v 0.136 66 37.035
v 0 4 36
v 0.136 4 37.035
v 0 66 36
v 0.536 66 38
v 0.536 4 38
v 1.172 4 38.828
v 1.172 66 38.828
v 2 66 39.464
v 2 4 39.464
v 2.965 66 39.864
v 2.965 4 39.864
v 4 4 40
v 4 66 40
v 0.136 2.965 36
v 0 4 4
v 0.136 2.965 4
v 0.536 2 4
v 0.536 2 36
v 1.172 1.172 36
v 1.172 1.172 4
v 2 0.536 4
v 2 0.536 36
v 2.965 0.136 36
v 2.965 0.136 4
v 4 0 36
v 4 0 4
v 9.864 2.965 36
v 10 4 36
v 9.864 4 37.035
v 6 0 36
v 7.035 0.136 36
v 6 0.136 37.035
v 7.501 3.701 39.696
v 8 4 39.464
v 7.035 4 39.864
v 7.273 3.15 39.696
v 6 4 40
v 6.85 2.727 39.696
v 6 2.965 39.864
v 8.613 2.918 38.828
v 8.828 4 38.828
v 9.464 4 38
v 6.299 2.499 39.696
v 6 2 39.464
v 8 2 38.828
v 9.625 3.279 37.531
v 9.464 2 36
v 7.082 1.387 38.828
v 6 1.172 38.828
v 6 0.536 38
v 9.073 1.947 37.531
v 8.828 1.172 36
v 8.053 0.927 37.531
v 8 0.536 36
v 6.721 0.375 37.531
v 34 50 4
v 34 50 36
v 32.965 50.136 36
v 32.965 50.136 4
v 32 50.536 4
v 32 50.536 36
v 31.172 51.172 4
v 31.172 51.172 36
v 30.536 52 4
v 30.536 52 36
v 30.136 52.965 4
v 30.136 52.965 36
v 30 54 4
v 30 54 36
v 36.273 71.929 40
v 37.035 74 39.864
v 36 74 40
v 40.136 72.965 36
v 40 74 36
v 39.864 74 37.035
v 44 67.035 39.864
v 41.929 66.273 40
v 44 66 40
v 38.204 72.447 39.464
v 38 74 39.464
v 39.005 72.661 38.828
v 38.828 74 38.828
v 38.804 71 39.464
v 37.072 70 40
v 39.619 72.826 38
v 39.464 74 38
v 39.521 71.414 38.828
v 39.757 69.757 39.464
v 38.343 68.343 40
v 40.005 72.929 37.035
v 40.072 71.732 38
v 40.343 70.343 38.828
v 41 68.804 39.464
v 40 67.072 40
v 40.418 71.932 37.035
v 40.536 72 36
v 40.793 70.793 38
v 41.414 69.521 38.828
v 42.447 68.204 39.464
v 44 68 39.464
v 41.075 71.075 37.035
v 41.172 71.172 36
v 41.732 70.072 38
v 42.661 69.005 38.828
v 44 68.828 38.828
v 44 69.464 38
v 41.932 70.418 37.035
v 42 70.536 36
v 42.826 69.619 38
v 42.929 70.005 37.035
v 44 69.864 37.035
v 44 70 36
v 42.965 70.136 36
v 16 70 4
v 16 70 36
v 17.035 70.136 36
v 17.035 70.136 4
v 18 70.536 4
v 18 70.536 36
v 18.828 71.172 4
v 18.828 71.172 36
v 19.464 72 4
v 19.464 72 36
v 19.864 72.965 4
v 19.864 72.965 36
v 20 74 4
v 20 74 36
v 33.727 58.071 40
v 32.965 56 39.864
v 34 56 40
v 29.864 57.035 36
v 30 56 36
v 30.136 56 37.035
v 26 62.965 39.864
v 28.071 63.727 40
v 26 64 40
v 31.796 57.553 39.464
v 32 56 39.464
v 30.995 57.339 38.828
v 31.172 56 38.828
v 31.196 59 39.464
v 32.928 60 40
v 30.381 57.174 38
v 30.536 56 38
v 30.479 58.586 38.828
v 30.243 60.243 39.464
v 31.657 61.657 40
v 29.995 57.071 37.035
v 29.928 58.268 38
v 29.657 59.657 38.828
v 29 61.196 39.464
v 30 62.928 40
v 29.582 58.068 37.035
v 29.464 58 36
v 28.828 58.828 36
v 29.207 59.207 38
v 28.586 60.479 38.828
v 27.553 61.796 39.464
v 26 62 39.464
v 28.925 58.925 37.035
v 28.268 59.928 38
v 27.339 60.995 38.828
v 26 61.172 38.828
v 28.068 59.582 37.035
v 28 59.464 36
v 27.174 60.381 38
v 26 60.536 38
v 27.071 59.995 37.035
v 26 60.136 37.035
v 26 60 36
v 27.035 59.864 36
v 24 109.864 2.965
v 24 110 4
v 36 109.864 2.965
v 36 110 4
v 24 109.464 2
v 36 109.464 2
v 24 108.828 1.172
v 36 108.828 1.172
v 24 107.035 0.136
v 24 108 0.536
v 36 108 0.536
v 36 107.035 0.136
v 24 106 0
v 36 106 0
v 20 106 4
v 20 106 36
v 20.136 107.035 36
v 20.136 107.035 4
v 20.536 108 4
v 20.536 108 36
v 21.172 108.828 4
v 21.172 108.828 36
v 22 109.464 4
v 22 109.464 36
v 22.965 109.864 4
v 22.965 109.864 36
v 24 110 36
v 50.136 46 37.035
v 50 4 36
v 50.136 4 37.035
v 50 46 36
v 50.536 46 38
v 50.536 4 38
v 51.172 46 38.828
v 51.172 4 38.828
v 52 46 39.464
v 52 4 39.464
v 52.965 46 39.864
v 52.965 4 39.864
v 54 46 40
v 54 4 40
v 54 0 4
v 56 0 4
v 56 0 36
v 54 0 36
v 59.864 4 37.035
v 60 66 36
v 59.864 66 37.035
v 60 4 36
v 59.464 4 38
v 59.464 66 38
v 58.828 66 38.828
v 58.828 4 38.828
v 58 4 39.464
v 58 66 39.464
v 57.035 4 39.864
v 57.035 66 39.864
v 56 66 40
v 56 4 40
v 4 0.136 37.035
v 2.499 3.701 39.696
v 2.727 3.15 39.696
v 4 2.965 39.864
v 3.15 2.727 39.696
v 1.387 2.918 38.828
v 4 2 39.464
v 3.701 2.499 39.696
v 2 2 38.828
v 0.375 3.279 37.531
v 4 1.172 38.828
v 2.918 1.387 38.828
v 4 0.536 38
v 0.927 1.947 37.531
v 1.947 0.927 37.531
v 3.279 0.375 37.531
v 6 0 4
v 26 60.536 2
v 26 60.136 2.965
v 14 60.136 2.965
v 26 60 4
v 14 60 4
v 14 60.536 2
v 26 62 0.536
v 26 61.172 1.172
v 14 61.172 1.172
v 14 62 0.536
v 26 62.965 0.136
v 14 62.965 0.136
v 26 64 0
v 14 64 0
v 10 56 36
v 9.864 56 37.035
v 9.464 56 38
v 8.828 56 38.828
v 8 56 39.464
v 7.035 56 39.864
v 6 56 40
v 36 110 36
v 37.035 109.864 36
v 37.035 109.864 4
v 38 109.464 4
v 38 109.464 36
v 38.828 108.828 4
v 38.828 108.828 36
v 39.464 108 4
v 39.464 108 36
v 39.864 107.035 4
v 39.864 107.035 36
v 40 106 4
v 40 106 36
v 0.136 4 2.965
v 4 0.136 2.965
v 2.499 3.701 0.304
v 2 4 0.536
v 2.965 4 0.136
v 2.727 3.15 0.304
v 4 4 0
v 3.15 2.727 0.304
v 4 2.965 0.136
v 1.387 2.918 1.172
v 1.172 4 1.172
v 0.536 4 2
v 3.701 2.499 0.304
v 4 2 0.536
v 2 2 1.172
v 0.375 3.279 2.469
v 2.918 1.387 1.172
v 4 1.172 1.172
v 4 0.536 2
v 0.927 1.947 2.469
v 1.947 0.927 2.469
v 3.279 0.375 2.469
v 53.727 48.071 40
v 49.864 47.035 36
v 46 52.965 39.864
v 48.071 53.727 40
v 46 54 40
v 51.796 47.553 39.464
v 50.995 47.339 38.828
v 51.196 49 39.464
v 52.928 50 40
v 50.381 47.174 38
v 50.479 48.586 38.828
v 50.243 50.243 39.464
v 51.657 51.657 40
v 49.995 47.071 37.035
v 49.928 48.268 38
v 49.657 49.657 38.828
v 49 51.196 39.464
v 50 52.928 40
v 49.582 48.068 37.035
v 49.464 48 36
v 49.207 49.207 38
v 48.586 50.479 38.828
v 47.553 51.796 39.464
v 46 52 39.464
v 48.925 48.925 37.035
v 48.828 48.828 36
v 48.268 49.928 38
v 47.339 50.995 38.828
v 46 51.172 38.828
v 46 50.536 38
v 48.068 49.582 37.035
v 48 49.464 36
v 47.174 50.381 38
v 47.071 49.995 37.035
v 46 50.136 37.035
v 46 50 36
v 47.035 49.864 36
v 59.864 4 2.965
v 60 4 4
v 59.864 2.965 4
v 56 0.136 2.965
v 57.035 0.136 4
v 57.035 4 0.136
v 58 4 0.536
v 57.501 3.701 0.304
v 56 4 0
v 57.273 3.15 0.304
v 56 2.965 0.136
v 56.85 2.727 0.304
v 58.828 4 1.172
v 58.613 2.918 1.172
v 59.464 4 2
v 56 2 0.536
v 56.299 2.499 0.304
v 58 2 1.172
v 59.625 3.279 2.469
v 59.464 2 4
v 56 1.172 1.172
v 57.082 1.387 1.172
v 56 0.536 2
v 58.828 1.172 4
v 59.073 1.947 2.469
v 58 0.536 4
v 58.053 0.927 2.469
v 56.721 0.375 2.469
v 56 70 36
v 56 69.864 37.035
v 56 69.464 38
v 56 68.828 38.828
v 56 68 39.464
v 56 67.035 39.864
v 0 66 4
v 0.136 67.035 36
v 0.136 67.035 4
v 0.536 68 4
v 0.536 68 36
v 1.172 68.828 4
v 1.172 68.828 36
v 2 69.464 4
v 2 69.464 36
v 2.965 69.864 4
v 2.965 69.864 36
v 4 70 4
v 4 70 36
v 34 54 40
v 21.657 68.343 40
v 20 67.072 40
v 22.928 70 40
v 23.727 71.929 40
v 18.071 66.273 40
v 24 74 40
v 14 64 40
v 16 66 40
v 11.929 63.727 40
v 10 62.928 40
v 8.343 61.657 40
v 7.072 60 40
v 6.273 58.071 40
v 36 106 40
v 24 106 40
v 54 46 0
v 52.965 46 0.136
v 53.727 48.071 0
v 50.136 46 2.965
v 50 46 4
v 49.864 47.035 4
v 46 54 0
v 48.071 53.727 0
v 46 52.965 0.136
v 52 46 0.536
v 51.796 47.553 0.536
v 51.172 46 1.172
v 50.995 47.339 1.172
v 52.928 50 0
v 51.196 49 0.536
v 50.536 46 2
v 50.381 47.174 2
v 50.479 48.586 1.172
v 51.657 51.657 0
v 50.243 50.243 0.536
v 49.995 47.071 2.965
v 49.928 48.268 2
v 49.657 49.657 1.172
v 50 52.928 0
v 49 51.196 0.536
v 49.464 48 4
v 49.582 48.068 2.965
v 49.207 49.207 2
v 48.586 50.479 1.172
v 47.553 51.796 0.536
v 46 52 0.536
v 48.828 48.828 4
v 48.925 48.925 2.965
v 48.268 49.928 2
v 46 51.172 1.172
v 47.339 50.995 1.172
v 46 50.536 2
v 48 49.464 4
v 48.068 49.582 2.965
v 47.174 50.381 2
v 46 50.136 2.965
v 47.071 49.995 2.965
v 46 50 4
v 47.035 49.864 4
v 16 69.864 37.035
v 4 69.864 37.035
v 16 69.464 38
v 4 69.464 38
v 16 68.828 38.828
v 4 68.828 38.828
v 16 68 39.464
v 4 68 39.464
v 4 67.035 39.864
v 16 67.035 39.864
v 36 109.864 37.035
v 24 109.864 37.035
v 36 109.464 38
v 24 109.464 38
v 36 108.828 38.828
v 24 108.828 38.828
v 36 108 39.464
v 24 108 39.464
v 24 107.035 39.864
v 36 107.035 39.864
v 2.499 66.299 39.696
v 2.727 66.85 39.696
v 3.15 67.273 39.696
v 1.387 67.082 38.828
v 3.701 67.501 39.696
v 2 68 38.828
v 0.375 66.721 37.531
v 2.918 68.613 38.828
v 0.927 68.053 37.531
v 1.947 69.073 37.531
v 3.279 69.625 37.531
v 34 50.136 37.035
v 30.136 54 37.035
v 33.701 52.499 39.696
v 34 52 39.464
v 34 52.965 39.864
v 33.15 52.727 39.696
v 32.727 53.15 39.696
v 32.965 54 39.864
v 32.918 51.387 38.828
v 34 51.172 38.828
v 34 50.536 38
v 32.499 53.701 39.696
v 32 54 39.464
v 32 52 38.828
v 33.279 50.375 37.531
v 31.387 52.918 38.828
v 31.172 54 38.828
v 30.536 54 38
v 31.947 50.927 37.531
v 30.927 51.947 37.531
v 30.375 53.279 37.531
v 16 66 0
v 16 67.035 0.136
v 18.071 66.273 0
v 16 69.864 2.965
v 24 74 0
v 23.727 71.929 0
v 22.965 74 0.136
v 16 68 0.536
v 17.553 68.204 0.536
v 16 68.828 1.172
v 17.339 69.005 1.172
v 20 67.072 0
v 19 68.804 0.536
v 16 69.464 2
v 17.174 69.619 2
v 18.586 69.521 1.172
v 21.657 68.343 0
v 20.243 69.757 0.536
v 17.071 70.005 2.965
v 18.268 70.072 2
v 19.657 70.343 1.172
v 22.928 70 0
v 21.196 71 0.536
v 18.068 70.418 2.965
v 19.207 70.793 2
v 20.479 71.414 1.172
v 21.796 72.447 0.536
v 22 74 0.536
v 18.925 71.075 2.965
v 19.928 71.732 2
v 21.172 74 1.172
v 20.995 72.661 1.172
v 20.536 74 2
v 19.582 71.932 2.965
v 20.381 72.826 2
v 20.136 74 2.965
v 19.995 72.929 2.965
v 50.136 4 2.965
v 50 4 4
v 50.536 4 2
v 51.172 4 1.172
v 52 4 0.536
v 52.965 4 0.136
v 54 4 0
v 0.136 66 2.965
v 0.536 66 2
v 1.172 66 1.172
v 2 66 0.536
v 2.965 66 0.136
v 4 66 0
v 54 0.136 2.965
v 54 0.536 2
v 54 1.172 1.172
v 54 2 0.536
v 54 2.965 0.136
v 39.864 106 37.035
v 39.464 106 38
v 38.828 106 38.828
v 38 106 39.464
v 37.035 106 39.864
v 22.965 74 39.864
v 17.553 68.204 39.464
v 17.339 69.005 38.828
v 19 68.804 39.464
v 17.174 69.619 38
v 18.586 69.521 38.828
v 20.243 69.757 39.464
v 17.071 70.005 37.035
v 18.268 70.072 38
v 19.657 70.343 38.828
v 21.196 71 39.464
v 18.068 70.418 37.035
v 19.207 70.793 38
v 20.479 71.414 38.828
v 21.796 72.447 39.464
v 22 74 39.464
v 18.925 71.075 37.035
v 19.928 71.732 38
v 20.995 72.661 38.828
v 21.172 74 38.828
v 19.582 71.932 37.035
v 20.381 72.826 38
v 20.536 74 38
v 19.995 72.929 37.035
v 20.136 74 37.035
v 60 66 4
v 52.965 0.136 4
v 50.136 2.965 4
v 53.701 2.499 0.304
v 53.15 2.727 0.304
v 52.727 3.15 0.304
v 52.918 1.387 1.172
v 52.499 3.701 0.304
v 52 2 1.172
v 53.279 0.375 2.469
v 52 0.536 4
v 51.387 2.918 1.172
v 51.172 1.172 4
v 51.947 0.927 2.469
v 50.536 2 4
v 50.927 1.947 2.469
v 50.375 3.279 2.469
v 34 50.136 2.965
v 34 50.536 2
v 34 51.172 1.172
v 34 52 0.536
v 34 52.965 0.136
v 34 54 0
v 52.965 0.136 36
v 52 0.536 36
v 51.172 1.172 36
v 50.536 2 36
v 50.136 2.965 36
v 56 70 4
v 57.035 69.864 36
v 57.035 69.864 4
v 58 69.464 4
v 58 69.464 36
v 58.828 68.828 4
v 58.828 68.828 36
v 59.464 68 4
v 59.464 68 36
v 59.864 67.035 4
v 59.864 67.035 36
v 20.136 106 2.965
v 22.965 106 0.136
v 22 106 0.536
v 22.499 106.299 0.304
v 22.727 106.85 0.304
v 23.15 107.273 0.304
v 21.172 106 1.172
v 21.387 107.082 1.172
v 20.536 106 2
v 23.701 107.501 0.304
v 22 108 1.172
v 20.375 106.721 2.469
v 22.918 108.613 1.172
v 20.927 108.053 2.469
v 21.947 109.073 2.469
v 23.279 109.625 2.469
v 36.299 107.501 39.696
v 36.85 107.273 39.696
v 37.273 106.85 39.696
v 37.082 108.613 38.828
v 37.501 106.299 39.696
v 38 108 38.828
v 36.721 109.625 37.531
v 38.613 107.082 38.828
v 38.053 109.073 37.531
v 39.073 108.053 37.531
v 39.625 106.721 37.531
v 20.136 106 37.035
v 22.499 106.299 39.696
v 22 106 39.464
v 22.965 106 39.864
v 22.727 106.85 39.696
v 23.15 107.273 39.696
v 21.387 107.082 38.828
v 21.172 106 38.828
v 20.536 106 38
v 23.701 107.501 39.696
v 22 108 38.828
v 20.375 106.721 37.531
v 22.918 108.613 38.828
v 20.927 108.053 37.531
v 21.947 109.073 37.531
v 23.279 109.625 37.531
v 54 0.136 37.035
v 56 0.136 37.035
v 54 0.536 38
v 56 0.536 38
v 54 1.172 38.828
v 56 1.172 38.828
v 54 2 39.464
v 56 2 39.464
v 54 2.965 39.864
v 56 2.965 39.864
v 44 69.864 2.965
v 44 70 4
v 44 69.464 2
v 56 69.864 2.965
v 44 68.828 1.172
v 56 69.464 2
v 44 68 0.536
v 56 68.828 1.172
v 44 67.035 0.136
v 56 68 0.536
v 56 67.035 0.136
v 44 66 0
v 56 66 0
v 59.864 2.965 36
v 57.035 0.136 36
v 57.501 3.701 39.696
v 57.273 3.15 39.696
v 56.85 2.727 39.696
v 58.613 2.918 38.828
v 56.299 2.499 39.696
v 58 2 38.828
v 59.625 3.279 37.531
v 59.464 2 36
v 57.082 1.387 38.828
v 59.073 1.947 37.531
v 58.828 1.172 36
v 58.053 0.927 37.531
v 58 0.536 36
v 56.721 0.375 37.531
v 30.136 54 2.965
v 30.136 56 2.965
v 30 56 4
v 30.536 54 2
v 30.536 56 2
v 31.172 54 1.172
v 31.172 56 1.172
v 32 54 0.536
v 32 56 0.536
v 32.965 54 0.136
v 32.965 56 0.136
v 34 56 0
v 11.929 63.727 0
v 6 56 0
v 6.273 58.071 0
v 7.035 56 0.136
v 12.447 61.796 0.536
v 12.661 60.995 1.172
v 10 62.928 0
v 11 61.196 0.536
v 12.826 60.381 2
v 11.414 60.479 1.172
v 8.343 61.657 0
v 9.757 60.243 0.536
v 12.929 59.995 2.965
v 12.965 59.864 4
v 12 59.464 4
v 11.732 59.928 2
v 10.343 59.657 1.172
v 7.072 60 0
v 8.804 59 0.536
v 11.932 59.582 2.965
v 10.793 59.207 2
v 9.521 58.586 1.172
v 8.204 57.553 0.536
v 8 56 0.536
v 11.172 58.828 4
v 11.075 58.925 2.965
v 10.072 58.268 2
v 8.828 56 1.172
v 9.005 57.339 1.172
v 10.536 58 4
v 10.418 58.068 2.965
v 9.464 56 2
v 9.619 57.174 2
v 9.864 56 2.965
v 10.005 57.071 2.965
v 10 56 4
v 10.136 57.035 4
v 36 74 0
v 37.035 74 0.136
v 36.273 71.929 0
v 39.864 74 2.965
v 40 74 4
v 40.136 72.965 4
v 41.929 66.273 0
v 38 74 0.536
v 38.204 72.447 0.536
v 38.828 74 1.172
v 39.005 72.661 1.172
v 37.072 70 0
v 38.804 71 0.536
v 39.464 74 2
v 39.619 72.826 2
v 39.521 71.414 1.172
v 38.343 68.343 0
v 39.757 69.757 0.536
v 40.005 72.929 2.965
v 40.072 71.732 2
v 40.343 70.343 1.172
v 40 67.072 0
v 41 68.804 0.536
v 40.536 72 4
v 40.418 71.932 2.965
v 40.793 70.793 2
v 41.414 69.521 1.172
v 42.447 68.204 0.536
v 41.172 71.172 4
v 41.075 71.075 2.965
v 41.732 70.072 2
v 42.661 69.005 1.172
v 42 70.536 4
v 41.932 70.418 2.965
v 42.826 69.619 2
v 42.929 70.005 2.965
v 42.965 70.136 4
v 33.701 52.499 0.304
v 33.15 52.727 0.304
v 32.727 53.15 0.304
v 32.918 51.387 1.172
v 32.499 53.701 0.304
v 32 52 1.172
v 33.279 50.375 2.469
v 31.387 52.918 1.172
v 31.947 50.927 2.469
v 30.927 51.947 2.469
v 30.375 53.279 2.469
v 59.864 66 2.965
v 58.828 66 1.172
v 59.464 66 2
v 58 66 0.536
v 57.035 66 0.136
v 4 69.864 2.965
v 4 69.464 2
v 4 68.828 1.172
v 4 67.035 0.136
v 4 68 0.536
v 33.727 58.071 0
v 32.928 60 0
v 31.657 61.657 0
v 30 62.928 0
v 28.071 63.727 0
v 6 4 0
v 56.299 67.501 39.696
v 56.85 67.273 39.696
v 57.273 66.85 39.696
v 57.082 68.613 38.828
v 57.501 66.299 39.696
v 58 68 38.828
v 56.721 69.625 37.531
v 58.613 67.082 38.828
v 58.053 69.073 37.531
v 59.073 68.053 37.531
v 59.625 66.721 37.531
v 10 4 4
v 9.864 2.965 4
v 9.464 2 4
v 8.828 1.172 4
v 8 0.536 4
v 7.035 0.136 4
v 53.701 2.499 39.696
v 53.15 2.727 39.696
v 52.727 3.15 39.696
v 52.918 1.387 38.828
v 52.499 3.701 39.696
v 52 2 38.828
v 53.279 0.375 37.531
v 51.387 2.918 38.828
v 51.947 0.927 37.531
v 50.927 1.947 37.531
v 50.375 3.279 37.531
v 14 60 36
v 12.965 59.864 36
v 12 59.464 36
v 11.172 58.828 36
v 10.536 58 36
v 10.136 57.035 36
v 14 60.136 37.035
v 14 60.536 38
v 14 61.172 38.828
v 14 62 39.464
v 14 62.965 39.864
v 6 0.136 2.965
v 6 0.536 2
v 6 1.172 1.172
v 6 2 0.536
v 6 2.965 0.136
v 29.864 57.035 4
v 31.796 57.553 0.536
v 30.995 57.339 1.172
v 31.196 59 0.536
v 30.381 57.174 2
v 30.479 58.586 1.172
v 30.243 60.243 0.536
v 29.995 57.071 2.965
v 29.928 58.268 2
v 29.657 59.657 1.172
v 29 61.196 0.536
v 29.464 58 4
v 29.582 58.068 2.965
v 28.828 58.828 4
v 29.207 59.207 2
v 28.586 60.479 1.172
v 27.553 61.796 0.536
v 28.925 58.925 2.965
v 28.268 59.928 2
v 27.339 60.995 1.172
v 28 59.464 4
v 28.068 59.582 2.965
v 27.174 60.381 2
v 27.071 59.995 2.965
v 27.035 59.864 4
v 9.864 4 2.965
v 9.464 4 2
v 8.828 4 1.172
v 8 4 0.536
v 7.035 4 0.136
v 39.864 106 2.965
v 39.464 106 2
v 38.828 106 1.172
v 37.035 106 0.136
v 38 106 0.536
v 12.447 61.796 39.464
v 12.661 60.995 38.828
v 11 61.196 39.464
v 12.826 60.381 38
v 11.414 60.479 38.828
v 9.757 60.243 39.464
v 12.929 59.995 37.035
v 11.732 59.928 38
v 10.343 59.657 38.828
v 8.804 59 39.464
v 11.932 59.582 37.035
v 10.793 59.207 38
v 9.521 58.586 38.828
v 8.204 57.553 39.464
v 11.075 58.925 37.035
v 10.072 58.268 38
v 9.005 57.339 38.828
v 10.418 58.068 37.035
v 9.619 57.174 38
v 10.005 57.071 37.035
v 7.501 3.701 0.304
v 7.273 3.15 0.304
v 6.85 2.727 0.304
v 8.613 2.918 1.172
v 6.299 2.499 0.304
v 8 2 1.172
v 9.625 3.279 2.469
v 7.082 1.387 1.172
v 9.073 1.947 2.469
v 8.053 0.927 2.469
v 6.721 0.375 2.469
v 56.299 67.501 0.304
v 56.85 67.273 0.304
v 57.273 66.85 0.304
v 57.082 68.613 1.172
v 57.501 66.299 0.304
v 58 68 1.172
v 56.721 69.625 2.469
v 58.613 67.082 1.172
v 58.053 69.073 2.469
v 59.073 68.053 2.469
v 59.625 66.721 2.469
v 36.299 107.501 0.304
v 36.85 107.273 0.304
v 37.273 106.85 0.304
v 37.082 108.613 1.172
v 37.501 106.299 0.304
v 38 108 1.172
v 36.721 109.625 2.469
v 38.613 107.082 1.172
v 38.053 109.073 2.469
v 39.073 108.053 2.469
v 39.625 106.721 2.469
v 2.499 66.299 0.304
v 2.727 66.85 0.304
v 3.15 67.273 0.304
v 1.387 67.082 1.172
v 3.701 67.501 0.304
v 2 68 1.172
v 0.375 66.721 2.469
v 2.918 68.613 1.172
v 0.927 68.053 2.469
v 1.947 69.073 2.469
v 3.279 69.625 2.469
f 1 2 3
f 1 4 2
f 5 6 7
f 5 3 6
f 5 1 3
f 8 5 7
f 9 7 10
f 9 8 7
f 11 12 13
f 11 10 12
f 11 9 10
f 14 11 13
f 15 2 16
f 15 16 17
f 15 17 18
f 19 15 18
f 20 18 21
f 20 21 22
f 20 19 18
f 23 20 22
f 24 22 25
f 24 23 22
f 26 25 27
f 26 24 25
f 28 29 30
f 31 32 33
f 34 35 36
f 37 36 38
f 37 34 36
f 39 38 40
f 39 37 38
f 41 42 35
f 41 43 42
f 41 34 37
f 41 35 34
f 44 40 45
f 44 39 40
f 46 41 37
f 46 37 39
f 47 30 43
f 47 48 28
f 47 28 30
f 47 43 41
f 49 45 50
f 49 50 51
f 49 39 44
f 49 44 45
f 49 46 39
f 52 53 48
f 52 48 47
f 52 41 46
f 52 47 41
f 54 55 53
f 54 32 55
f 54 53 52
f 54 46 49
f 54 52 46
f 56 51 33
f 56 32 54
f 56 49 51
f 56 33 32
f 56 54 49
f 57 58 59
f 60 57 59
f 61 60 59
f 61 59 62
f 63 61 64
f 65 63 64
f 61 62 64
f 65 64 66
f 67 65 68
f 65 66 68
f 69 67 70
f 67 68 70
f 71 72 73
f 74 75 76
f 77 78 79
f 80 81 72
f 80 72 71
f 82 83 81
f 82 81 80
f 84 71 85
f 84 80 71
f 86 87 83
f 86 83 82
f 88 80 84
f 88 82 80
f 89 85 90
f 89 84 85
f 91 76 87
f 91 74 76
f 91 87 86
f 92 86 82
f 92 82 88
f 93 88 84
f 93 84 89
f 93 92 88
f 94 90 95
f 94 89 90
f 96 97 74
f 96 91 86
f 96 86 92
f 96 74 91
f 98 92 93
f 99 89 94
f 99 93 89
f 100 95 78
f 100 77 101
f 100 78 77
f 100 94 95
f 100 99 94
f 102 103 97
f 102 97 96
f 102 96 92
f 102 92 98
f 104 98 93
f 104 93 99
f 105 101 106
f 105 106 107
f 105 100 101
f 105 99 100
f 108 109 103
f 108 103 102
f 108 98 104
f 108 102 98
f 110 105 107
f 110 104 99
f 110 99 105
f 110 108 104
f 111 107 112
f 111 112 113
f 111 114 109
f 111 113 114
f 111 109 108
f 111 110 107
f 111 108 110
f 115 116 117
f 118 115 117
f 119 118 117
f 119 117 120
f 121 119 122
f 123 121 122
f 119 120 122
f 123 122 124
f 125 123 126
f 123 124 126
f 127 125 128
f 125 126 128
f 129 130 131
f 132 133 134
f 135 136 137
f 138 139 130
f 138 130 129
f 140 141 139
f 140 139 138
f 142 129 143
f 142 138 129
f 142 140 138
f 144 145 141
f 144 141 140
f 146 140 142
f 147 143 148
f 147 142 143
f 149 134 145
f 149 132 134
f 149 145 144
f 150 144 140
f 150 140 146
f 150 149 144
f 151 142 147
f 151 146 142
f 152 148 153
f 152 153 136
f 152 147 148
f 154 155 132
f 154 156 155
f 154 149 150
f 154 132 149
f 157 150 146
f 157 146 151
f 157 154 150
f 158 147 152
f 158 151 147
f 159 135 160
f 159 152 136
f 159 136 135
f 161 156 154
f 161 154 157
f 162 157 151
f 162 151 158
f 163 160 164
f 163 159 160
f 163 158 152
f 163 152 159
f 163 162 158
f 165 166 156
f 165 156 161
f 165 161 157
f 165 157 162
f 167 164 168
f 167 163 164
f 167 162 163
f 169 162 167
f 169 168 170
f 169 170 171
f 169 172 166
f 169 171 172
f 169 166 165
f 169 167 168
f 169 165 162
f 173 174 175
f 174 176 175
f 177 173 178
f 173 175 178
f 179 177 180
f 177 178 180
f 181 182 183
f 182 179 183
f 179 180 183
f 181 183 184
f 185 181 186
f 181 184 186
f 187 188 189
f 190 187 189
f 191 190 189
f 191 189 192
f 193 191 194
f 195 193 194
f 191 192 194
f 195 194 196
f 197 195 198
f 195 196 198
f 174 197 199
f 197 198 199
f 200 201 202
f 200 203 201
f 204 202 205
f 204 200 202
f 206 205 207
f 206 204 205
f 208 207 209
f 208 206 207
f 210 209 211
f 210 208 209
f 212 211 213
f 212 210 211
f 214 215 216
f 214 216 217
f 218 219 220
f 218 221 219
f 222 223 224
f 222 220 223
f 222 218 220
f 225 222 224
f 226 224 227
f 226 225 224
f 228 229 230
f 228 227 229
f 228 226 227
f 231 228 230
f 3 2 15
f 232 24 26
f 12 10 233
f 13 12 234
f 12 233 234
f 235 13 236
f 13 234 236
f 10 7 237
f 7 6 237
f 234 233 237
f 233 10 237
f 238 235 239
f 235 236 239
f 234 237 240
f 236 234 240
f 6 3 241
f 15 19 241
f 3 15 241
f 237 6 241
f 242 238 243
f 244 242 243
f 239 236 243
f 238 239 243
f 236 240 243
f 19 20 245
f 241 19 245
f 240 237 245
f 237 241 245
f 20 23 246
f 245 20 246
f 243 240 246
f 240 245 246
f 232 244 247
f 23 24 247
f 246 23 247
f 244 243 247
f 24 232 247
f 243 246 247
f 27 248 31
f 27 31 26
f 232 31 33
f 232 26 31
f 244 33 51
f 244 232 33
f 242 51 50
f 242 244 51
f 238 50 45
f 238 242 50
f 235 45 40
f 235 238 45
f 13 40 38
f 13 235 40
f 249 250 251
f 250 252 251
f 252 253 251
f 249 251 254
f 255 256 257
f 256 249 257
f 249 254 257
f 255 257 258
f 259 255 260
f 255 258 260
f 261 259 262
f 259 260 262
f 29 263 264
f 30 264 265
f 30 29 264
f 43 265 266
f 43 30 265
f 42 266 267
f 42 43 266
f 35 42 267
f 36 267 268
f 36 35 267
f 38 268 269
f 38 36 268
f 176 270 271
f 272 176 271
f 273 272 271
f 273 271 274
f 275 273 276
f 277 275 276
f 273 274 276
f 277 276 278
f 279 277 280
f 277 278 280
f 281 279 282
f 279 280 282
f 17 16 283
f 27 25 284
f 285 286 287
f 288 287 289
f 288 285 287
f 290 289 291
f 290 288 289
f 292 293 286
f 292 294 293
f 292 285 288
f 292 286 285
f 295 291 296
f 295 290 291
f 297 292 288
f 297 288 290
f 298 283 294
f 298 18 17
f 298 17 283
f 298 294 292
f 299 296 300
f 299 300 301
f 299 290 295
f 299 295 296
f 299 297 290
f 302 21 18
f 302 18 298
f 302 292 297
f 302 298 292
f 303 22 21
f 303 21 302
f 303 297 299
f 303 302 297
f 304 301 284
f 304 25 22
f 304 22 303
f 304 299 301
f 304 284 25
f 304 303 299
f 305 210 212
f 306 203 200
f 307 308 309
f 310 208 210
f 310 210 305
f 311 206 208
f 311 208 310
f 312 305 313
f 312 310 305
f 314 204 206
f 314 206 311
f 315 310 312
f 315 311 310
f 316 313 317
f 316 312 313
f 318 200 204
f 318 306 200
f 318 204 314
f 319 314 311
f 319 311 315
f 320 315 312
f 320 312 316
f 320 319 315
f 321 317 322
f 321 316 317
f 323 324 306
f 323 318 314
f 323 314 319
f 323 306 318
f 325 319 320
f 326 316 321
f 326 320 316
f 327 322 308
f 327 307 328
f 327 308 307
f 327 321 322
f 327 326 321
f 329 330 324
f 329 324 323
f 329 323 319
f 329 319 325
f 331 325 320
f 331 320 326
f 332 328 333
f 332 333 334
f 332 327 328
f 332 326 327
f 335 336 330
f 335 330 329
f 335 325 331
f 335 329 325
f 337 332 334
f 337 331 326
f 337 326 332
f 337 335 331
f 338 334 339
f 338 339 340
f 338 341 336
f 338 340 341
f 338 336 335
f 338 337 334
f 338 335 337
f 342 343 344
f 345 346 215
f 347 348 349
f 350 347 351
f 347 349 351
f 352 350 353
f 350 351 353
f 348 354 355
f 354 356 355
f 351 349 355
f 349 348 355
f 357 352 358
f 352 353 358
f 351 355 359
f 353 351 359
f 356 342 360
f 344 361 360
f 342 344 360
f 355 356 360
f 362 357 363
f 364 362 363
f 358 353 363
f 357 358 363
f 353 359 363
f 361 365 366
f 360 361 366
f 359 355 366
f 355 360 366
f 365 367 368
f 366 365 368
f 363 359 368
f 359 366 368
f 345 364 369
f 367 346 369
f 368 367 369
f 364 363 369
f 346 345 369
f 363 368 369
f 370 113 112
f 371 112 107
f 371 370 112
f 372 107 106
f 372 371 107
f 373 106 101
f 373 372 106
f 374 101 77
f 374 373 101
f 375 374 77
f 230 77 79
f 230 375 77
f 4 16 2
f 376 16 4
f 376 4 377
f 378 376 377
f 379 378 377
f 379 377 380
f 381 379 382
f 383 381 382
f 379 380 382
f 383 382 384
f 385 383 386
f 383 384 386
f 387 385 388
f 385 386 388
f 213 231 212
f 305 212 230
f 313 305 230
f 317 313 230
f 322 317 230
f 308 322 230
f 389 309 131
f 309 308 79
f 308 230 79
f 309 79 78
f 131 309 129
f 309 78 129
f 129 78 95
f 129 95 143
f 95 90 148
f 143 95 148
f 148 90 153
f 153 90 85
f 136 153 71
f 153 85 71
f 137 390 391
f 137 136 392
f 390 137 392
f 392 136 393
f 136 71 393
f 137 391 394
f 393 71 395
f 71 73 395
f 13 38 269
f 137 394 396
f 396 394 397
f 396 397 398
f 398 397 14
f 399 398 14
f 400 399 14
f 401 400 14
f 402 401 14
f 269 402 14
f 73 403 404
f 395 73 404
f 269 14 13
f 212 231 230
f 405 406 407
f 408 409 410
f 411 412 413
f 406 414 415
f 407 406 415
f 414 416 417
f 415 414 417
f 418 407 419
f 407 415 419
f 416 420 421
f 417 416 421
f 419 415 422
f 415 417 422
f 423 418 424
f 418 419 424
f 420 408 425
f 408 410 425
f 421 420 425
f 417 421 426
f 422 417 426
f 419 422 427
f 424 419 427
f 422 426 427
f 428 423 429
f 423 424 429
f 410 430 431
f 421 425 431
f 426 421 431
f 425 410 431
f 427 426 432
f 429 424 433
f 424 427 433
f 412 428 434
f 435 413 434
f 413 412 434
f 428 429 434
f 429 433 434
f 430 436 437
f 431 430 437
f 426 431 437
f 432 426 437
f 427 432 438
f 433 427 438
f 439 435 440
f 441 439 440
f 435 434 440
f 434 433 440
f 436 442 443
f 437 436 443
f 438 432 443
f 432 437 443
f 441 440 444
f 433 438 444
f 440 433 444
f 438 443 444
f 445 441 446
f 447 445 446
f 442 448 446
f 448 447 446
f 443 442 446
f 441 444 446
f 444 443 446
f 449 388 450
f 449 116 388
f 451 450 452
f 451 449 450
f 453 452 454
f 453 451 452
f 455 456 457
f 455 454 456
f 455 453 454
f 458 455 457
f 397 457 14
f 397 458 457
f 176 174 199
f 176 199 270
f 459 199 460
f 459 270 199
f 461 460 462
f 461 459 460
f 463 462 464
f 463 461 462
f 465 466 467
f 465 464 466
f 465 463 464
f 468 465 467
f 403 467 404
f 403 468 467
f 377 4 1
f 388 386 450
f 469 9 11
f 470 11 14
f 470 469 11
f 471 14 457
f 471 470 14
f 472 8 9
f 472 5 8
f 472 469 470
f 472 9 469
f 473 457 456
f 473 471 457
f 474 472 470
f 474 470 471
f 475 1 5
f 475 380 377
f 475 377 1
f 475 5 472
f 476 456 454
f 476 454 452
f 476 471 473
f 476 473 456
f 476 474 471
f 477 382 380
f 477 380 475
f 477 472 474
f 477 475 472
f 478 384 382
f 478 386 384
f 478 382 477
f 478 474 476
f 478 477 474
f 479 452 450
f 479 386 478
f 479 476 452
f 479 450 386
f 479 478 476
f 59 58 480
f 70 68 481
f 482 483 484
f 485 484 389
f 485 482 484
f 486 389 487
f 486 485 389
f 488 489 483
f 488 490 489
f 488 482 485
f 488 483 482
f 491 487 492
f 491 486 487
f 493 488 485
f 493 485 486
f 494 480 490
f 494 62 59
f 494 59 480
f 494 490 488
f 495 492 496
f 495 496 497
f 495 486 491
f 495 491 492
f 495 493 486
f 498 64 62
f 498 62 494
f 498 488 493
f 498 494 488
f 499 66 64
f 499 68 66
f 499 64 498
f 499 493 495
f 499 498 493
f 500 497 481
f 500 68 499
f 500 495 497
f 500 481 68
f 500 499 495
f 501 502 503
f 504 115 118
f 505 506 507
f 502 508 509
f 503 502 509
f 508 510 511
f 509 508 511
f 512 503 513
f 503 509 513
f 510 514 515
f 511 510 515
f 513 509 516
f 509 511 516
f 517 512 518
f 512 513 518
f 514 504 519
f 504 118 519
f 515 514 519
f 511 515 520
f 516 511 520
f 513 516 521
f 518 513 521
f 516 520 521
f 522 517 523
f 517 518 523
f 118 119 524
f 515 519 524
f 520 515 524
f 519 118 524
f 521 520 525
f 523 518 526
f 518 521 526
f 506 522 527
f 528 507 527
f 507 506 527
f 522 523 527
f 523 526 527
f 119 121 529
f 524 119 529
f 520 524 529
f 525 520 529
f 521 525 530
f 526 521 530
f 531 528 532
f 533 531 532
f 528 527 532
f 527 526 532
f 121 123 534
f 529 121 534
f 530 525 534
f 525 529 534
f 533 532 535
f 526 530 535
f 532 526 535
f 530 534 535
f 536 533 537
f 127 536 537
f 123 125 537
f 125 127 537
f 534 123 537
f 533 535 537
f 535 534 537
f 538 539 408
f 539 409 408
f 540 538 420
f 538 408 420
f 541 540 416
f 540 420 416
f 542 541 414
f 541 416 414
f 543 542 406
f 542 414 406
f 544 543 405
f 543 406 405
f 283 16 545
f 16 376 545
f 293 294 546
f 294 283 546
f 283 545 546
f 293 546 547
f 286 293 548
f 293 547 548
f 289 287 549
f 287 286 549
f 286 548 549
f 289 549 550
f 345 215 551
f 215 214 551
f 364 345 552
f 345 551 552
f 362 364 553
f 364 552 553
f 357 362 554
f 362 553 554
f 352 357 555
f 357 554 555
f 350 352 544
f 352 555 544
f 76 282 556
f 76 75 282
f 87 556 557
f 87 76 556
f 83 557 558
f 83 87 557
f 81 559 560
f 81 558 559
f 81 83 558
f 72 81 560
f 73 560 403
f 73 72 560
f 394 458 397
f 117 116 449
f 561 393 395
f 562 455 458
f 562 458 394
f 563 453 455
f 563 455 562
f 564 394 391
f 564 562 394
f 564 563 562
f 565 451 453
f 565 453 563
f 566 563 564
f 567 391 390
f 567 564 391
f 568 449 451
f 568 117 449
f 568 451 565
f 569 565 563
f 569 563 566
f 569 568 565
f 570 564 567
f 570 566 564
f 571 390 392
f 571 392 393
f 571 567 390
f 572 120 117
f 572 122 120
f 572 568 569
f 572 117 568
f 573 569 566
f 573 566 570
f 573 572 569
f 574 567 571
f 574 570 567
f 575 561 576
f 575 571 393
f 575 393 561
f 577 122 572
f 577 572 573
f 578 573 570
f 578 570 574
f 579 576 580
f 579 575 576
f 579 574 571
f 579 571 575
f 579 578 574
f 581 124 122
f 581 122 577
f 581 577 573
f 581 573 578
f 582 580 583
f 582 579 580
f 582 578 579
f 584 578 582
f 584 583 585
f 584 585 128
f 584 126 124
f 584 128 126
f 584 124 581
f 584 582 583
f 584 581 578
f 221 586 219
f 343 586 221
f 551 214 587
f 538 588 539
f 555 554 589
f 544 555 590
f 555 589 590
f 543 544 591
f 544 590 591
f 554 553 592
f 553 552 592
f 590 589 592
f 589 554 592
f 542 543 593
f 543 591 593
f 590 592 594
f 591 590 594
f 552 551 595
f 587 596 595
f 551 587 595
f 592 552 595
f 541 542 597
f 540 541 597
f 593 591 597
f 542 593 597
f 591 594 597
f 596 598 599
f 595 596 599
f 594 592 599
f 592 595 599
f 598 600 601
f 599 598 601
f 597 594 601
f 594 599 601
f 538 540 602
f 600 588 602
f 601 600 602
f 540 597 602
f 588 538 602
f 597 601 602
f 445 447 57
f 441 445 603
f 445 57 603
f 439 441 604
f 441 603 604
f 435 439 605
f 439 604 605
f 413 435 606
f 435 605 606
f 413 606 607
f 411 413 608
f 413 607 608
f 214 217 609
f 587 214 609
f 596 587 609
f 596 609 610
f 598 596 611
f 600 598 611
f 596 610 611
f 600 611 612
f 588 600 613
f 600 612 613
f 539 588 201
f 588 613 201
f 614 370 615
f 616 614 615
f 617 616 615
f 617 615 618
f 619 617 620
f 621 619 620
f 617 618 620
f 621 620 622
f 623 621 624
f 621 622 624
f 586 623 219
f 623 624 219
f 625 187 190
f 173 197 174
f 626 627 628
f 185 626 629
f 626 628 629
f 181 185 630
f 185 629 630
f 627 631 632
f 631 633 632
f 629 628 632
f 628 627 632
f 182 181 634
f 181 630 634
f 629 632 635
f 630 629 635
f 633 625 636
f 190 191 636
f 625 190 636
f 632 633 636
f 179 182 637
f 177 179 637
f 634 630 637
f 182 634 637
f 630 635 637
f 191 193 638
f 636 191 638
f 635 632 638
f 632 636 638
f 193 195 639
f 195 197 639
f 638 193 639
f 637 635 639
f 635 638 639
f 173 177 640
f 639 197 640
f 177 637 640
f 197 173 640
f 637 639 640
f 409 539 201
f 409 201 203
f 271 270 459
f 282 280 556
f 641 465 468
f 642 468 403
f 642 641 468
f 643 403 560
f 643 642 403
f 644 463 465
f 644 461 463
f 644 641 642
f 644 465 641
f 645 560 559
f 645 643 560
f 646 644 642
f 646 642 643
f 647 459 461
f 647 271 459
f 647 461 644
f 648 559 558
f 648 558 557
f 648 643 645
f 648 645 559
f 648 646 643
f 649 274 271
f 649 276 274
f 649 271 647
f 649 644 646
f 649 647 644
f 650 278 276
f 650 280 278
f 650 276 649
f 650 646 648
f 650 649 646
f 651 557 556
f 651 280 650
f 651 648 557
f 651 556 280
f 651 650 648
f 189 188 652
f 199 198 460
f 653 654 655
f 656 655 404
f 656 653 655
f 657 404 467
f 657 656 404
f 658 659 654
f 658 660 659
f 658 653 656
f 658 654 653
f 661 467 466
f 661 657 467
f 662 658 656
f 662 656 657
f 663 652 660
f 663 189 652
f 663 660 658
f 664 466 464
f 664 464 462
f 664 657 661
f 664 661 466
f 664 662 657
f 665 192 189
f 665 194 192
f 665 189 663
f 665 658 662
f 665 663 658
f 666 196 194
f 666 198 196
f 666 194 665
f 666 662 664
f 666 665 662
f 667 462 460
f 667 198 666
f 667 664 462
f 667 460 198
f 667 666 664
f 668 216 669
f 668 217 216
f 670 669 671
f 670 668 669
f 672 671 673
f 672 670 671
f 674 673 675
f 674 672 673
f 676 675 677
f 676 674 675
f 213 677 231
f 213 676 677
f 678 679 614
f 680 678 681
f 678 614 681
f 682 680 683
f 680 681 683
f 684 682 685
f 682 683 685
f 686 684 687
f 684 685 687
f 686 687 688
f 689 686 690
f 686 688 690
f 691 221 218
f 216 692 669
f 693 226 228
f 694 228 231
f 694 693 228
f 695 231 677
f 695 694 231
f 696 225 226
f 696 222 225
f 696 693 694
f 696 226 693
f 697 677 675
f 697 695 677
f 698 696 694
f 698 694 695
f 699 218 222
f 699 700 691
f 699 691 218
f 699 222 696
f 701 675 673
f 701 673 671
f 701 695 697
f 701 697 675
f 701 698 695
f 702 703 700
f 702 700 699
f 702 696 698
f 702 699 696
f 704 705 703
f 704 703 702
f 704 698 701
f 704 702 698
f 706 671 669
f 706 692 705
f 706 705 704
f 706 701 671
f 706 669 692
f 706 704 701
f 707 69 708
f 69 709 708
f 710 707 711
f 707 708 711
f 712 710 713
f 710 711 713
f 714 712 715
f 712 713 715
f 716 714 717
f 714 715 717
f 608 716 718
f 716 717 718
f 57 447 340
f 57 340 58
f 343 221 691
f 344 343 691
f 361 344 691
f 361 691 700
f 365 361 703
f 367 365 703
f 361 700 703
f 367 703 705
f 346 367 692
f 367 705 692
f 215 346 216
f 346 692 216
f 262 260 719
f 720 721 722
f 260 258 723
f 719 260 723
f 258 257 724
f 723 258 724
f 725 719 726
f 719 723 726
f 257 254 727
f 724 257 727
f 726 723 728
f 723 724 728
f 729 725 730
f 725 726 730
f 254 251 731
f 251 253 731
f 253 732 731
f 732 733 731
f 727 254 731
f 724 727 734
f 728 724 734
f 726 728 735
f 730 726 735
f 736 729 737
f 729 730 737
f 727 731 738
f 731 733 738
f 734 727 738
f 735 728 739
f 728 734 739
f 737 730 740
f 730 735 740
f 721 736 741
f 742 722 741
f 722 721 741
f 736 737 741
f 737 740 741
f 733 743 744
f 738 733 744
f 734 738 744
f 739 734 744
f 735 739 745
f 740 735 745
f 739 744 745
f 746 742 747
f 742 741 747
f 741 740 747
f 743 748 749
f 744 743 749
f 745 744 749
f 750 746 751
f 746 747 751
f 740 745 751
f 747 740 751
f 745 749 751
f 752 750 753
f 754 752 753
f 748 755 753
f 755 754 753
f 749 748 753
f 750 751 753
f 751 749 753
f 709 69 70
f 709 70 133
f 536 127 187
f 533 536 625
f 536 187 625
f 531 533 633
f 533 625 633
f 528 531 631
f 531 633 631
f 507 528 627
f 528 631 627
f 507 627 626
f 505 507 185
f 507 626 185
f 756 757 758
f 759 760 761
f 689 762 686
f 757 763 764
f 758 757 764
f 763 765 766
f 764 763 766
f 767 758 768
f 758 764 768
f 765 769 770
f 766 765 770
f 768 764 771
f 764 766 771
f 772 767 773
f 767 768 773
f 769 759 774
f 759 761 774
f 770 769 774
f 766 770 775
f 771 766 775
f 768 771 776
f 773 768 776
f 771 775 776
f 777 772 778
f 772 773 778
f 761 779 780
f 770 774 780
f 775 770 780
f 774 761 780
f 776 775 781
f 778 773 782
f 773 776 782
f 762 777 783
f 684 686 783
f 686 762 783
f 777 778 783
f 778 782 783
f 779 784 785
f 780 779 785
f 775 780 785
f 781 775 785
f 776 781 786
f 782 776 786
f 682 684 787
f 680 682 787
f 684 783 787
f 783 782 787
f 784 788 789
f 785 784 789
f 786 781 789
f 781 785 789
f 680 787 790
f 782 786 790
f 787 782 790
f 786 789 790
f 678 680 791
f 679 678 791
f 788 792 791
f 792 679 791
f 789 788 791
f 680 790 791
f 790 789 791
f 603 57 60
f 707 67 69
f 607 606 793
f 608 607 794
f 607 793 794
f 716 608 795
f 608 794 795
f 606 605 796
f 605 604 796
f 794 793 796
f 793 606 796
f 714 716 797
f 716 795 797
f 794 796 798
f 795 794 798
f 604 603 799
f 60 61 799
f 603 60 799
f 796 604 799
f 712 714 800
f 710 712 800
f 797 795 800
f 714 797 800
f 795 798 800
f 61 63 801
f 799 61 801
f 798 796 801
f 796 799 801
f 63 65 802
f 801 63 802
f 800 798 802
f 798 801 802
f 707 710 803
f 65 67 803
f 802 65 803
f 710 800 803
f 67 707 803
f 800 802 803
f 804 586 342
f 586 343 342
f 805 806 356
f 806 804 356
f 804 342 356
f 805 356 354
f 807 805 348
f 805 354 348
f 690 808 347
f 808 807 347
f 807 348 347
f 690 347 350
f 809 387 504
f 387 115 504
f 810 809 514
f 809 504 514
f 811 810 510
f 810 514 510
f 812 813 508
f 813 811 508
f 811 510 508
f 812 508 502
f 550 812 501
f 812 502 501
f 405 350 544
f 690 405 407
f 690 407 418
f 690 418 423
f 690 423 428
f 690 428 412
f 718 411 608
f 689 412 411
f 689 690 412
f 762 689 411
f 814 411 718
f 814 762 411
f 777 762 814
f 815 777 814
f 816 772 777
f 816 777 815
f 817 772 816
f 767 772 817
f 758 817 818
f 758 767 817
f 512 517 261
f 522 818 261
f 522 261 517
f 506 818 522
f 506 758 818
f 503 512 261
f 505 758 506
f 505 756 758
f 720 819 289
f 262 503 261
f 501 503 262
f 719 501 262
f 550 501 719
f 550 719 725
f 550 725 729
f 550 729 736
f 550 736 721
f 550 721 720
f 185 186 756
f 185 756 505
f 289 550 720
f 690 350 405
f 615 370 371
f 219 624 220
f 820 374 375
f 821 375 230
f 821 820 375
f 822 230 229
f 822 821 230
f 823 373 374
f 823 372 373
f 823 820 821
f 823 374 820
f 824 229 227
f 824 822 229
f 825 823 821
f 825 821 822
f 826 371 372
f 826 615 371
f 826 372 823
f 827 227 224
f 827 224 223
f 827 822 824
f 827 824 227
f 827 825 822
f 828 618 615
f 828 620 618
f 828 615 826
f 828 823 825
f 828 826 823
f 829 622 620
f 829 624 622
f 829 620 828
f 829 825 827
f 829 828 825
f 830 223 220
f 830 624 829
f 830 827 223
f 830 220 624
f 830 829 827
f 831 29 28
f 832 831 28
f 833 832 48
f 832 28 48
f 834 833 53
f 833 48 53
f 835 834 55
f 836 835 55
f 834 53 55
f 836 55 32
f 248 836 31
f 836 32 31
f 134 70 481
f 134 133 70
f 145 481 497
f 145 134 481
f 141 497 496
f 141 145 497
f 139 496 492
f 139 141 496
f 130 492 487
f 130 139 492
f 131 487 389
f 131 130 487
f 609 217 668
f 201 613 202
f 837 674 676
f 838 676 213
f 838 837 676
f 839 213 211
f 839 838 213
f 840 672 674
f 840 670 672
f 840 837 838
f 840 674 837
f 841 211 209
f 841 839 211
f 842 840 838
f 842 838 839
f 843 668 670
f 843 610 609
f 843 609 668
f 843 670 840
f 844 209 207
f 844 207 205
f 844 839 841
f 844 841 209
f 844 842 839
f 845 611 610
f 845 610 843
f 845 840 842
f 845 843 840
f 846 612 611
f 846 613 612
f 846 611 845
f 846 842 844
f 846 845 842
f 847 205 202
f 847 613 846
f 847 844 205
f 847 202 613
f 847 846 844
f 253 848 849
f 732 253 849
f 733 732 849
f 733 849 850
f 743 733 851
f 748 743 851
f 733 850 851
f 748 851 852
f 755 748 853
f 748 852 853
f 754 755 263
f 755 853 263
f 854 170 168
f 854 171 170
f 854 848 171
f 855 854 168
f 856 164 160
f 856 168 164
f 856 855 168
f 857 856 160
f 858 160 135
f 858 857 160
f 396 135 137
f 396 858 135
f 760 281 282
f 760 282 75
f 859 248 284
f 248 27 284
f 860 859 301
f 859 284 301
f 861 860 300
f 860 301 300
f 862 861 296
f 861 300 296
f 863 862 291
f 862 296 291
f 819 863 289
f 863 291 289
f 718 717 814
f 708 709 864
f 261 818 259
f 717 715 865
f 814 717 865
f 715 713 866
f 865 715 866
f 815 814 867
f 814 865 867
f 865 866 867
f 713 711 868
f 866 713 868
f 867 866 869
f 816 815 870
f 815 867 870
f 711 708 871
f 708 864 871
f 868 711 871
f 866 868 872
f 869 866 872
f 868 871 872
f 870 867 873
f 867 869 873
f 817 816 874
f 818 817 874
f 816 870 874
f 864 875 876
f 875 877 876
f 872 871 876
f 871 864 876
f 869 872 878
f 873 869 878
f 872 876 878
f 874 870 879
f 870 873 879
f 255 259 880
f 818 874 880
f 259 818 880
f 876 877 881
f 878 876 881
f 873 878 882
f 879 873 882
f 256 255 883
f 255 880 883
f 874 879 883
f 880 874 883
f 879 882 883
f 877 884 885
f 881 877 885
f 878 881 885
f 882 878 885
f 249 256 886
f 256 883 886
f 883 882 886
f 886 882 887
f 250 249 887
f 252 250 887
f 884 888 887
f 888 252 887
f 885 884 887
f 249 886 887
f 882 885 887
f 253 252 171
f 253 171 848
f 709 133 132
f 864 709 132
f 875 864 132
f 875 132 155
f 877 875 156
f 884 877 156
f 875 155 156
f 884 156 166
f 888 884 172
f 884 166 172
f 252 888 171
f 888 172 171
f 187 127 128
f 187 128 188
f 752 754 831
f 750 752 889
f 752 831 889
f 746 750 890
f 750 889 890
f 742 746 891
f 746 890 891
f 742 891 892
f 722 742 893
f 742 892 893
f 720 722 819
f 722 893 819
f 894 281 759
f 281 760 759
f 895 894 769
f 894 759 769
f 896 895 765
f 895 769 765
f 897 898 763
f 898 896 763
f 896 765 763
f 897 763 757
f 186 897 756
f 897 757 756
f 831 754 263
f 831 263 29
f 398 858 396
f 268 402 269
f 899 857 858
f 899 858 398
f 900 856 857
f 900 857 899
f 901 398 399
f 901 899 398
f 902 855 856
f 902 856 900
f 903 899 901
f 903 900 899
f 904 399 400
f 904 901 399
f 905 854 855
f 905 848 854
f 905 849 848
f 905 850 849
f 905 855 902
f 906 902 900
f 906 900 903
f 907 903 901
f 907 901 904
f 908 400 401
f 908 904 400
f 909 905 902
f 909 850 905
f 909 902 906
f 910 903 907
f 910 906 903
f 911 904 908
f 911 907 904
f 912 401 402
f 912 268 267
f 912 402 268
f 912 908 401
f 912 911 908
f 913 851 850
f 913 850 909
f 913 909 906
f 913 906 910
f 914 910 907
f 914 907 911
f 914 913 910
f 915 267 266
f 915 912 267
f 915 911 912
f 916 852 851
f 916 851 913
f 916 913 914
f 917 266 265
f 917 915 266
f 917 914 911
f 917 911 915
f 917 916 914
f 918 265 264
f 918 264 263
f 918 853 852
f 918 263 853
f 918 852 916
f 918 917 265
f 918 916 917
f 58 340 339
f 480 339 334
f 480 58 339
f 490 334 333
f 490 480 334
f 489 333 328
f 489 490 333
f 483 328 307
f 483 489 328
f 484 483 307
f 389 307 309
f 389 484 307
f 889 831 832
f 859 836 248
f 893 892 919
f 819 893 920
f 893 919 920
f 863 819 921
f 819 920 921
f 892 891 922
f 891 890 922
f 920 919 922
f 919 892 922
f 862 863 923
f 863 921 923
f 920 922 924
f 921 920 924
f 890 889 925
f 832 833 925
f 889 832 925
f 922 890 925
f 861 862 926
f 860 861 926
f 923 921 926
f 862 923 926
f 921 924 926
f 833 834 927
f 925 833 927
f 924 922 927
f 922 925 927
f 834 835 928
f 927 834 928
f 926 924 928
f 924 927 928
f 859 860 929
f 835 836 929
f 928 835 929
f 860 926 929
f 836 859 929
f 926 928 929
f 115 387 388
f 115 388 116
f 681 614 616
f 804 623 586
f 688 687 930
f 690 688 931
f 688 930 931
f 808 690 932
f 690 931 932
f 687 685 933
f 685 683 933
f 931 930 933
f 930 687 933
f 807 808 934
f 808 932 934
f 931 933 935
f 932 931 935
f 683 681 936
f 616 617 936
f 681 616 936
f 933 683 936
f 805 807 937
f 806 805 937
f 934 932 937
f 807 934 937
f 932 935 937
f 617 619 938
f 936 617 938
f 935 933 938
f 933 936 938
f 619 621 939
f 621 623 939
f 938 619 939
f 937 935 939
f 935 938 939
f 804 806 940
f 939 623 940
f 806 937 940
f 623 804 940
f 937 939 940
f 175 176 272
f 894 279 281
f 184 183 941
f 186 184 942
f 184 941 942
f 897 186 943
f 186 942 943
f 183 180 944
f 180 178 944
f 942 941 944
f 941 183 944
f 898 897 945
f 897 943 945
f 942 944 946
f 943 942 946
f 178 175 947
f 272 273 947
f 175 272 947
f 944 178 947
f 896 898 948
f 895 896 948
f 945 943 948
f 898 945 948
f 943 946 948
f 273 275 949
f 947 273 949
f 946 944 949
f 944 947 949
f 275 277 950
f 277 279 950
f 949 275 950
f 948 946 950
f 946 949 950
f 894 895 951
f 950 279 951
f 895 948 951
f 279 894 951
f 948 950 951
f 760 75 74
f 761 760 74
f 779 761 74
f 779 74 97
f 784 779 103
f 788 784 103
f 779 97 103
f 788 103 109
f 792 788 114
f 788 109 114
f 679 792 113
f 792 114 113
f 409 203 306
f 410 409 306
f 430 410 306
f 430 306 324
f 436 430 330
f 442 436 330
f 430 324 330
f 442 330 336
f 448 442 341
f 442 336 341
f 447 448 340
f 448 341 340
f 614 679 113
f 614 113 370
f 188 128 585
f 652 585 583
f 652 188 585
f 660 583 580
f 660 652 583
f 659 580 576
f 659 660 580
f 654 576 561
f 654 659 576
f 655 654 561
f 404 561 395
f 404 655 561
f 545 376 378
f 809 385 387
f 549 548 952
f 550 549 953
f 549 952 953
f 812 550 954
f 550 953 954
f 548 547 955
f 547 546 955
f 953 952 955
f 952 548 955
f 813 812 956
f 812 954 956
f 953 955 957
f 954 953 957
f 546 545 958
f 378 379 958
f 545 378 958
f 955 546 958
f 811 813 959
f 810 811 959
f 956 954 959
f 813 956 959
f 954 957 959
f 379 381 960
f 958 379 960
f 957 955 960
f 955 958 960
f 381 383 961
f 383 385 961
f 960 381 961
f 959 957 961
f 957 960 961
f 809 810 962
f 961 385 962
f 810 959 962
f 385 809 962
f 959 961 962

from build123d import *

# Parameters (mm, degrees)
PAD_DEPTH = 40
FILLET_R  = 4


with BuildPart() as part:
    # Sketch (on XY_Plane of Origin) → Pad (new body)
    with BuildSketch(Plane.XY):
        Polygon((0, 0), (0, 70), (20, 70), (20, 110), (40, 110), (40, 70), (60, 70), (60, 0), (50, 0), (50, 50), (30, 50), (30, 60), (10, 60), (10, 0), align=None)
    extrude(amount=PAD_DEPTH)

    # Fillet
    fillet_edges = [part.edges().sort_by_distance(p)[0] for p in [
        (0, 0, 20),
        (0, 70, 20),
        (0, 35, 0),
        (0, 35, 40),
        (20, 70, 20),
        (10, 70, 0),
        (10, 70, 40),
        (20, 110, 20),
        (20, 90, 0),
        (20, 90, 40),
        (40, 110, 20),
        (30, 110, 0),
        (30, 110, 40),
        (40, 70, 20),
        (40, 90, 0),
        (40, 90, 40),
        (60, 70, 20),
        (50, 70, 0),
        (50, 70, 40),
        (60, 0, 20),
        (60, 35, 0),
        (60, 35, 40),
        (50, 0, 20),
        (55, 0, 0),
        (55, 0, 40),
        (50, 50, 20),
        (50, 25, 0),
        (50, 25, 40),
        (30, 50, 20),
        (40, 50, 0),
        (40, 50, 40),
        (30, 60, 20),
        (30, 55, 0),
        (30, 55, 40),
        (10, 60, 20),
        (20, 60, 0),
        (20, 60, 40),
        (10, 0, 20),
        (10, 30, 0),
        (10, 30, 40),
        (5, 0, 0),
        (5, 0, 40),
    ]]
    fillet(fillet_edges, radius=FILLET_R)


solid = part.part
